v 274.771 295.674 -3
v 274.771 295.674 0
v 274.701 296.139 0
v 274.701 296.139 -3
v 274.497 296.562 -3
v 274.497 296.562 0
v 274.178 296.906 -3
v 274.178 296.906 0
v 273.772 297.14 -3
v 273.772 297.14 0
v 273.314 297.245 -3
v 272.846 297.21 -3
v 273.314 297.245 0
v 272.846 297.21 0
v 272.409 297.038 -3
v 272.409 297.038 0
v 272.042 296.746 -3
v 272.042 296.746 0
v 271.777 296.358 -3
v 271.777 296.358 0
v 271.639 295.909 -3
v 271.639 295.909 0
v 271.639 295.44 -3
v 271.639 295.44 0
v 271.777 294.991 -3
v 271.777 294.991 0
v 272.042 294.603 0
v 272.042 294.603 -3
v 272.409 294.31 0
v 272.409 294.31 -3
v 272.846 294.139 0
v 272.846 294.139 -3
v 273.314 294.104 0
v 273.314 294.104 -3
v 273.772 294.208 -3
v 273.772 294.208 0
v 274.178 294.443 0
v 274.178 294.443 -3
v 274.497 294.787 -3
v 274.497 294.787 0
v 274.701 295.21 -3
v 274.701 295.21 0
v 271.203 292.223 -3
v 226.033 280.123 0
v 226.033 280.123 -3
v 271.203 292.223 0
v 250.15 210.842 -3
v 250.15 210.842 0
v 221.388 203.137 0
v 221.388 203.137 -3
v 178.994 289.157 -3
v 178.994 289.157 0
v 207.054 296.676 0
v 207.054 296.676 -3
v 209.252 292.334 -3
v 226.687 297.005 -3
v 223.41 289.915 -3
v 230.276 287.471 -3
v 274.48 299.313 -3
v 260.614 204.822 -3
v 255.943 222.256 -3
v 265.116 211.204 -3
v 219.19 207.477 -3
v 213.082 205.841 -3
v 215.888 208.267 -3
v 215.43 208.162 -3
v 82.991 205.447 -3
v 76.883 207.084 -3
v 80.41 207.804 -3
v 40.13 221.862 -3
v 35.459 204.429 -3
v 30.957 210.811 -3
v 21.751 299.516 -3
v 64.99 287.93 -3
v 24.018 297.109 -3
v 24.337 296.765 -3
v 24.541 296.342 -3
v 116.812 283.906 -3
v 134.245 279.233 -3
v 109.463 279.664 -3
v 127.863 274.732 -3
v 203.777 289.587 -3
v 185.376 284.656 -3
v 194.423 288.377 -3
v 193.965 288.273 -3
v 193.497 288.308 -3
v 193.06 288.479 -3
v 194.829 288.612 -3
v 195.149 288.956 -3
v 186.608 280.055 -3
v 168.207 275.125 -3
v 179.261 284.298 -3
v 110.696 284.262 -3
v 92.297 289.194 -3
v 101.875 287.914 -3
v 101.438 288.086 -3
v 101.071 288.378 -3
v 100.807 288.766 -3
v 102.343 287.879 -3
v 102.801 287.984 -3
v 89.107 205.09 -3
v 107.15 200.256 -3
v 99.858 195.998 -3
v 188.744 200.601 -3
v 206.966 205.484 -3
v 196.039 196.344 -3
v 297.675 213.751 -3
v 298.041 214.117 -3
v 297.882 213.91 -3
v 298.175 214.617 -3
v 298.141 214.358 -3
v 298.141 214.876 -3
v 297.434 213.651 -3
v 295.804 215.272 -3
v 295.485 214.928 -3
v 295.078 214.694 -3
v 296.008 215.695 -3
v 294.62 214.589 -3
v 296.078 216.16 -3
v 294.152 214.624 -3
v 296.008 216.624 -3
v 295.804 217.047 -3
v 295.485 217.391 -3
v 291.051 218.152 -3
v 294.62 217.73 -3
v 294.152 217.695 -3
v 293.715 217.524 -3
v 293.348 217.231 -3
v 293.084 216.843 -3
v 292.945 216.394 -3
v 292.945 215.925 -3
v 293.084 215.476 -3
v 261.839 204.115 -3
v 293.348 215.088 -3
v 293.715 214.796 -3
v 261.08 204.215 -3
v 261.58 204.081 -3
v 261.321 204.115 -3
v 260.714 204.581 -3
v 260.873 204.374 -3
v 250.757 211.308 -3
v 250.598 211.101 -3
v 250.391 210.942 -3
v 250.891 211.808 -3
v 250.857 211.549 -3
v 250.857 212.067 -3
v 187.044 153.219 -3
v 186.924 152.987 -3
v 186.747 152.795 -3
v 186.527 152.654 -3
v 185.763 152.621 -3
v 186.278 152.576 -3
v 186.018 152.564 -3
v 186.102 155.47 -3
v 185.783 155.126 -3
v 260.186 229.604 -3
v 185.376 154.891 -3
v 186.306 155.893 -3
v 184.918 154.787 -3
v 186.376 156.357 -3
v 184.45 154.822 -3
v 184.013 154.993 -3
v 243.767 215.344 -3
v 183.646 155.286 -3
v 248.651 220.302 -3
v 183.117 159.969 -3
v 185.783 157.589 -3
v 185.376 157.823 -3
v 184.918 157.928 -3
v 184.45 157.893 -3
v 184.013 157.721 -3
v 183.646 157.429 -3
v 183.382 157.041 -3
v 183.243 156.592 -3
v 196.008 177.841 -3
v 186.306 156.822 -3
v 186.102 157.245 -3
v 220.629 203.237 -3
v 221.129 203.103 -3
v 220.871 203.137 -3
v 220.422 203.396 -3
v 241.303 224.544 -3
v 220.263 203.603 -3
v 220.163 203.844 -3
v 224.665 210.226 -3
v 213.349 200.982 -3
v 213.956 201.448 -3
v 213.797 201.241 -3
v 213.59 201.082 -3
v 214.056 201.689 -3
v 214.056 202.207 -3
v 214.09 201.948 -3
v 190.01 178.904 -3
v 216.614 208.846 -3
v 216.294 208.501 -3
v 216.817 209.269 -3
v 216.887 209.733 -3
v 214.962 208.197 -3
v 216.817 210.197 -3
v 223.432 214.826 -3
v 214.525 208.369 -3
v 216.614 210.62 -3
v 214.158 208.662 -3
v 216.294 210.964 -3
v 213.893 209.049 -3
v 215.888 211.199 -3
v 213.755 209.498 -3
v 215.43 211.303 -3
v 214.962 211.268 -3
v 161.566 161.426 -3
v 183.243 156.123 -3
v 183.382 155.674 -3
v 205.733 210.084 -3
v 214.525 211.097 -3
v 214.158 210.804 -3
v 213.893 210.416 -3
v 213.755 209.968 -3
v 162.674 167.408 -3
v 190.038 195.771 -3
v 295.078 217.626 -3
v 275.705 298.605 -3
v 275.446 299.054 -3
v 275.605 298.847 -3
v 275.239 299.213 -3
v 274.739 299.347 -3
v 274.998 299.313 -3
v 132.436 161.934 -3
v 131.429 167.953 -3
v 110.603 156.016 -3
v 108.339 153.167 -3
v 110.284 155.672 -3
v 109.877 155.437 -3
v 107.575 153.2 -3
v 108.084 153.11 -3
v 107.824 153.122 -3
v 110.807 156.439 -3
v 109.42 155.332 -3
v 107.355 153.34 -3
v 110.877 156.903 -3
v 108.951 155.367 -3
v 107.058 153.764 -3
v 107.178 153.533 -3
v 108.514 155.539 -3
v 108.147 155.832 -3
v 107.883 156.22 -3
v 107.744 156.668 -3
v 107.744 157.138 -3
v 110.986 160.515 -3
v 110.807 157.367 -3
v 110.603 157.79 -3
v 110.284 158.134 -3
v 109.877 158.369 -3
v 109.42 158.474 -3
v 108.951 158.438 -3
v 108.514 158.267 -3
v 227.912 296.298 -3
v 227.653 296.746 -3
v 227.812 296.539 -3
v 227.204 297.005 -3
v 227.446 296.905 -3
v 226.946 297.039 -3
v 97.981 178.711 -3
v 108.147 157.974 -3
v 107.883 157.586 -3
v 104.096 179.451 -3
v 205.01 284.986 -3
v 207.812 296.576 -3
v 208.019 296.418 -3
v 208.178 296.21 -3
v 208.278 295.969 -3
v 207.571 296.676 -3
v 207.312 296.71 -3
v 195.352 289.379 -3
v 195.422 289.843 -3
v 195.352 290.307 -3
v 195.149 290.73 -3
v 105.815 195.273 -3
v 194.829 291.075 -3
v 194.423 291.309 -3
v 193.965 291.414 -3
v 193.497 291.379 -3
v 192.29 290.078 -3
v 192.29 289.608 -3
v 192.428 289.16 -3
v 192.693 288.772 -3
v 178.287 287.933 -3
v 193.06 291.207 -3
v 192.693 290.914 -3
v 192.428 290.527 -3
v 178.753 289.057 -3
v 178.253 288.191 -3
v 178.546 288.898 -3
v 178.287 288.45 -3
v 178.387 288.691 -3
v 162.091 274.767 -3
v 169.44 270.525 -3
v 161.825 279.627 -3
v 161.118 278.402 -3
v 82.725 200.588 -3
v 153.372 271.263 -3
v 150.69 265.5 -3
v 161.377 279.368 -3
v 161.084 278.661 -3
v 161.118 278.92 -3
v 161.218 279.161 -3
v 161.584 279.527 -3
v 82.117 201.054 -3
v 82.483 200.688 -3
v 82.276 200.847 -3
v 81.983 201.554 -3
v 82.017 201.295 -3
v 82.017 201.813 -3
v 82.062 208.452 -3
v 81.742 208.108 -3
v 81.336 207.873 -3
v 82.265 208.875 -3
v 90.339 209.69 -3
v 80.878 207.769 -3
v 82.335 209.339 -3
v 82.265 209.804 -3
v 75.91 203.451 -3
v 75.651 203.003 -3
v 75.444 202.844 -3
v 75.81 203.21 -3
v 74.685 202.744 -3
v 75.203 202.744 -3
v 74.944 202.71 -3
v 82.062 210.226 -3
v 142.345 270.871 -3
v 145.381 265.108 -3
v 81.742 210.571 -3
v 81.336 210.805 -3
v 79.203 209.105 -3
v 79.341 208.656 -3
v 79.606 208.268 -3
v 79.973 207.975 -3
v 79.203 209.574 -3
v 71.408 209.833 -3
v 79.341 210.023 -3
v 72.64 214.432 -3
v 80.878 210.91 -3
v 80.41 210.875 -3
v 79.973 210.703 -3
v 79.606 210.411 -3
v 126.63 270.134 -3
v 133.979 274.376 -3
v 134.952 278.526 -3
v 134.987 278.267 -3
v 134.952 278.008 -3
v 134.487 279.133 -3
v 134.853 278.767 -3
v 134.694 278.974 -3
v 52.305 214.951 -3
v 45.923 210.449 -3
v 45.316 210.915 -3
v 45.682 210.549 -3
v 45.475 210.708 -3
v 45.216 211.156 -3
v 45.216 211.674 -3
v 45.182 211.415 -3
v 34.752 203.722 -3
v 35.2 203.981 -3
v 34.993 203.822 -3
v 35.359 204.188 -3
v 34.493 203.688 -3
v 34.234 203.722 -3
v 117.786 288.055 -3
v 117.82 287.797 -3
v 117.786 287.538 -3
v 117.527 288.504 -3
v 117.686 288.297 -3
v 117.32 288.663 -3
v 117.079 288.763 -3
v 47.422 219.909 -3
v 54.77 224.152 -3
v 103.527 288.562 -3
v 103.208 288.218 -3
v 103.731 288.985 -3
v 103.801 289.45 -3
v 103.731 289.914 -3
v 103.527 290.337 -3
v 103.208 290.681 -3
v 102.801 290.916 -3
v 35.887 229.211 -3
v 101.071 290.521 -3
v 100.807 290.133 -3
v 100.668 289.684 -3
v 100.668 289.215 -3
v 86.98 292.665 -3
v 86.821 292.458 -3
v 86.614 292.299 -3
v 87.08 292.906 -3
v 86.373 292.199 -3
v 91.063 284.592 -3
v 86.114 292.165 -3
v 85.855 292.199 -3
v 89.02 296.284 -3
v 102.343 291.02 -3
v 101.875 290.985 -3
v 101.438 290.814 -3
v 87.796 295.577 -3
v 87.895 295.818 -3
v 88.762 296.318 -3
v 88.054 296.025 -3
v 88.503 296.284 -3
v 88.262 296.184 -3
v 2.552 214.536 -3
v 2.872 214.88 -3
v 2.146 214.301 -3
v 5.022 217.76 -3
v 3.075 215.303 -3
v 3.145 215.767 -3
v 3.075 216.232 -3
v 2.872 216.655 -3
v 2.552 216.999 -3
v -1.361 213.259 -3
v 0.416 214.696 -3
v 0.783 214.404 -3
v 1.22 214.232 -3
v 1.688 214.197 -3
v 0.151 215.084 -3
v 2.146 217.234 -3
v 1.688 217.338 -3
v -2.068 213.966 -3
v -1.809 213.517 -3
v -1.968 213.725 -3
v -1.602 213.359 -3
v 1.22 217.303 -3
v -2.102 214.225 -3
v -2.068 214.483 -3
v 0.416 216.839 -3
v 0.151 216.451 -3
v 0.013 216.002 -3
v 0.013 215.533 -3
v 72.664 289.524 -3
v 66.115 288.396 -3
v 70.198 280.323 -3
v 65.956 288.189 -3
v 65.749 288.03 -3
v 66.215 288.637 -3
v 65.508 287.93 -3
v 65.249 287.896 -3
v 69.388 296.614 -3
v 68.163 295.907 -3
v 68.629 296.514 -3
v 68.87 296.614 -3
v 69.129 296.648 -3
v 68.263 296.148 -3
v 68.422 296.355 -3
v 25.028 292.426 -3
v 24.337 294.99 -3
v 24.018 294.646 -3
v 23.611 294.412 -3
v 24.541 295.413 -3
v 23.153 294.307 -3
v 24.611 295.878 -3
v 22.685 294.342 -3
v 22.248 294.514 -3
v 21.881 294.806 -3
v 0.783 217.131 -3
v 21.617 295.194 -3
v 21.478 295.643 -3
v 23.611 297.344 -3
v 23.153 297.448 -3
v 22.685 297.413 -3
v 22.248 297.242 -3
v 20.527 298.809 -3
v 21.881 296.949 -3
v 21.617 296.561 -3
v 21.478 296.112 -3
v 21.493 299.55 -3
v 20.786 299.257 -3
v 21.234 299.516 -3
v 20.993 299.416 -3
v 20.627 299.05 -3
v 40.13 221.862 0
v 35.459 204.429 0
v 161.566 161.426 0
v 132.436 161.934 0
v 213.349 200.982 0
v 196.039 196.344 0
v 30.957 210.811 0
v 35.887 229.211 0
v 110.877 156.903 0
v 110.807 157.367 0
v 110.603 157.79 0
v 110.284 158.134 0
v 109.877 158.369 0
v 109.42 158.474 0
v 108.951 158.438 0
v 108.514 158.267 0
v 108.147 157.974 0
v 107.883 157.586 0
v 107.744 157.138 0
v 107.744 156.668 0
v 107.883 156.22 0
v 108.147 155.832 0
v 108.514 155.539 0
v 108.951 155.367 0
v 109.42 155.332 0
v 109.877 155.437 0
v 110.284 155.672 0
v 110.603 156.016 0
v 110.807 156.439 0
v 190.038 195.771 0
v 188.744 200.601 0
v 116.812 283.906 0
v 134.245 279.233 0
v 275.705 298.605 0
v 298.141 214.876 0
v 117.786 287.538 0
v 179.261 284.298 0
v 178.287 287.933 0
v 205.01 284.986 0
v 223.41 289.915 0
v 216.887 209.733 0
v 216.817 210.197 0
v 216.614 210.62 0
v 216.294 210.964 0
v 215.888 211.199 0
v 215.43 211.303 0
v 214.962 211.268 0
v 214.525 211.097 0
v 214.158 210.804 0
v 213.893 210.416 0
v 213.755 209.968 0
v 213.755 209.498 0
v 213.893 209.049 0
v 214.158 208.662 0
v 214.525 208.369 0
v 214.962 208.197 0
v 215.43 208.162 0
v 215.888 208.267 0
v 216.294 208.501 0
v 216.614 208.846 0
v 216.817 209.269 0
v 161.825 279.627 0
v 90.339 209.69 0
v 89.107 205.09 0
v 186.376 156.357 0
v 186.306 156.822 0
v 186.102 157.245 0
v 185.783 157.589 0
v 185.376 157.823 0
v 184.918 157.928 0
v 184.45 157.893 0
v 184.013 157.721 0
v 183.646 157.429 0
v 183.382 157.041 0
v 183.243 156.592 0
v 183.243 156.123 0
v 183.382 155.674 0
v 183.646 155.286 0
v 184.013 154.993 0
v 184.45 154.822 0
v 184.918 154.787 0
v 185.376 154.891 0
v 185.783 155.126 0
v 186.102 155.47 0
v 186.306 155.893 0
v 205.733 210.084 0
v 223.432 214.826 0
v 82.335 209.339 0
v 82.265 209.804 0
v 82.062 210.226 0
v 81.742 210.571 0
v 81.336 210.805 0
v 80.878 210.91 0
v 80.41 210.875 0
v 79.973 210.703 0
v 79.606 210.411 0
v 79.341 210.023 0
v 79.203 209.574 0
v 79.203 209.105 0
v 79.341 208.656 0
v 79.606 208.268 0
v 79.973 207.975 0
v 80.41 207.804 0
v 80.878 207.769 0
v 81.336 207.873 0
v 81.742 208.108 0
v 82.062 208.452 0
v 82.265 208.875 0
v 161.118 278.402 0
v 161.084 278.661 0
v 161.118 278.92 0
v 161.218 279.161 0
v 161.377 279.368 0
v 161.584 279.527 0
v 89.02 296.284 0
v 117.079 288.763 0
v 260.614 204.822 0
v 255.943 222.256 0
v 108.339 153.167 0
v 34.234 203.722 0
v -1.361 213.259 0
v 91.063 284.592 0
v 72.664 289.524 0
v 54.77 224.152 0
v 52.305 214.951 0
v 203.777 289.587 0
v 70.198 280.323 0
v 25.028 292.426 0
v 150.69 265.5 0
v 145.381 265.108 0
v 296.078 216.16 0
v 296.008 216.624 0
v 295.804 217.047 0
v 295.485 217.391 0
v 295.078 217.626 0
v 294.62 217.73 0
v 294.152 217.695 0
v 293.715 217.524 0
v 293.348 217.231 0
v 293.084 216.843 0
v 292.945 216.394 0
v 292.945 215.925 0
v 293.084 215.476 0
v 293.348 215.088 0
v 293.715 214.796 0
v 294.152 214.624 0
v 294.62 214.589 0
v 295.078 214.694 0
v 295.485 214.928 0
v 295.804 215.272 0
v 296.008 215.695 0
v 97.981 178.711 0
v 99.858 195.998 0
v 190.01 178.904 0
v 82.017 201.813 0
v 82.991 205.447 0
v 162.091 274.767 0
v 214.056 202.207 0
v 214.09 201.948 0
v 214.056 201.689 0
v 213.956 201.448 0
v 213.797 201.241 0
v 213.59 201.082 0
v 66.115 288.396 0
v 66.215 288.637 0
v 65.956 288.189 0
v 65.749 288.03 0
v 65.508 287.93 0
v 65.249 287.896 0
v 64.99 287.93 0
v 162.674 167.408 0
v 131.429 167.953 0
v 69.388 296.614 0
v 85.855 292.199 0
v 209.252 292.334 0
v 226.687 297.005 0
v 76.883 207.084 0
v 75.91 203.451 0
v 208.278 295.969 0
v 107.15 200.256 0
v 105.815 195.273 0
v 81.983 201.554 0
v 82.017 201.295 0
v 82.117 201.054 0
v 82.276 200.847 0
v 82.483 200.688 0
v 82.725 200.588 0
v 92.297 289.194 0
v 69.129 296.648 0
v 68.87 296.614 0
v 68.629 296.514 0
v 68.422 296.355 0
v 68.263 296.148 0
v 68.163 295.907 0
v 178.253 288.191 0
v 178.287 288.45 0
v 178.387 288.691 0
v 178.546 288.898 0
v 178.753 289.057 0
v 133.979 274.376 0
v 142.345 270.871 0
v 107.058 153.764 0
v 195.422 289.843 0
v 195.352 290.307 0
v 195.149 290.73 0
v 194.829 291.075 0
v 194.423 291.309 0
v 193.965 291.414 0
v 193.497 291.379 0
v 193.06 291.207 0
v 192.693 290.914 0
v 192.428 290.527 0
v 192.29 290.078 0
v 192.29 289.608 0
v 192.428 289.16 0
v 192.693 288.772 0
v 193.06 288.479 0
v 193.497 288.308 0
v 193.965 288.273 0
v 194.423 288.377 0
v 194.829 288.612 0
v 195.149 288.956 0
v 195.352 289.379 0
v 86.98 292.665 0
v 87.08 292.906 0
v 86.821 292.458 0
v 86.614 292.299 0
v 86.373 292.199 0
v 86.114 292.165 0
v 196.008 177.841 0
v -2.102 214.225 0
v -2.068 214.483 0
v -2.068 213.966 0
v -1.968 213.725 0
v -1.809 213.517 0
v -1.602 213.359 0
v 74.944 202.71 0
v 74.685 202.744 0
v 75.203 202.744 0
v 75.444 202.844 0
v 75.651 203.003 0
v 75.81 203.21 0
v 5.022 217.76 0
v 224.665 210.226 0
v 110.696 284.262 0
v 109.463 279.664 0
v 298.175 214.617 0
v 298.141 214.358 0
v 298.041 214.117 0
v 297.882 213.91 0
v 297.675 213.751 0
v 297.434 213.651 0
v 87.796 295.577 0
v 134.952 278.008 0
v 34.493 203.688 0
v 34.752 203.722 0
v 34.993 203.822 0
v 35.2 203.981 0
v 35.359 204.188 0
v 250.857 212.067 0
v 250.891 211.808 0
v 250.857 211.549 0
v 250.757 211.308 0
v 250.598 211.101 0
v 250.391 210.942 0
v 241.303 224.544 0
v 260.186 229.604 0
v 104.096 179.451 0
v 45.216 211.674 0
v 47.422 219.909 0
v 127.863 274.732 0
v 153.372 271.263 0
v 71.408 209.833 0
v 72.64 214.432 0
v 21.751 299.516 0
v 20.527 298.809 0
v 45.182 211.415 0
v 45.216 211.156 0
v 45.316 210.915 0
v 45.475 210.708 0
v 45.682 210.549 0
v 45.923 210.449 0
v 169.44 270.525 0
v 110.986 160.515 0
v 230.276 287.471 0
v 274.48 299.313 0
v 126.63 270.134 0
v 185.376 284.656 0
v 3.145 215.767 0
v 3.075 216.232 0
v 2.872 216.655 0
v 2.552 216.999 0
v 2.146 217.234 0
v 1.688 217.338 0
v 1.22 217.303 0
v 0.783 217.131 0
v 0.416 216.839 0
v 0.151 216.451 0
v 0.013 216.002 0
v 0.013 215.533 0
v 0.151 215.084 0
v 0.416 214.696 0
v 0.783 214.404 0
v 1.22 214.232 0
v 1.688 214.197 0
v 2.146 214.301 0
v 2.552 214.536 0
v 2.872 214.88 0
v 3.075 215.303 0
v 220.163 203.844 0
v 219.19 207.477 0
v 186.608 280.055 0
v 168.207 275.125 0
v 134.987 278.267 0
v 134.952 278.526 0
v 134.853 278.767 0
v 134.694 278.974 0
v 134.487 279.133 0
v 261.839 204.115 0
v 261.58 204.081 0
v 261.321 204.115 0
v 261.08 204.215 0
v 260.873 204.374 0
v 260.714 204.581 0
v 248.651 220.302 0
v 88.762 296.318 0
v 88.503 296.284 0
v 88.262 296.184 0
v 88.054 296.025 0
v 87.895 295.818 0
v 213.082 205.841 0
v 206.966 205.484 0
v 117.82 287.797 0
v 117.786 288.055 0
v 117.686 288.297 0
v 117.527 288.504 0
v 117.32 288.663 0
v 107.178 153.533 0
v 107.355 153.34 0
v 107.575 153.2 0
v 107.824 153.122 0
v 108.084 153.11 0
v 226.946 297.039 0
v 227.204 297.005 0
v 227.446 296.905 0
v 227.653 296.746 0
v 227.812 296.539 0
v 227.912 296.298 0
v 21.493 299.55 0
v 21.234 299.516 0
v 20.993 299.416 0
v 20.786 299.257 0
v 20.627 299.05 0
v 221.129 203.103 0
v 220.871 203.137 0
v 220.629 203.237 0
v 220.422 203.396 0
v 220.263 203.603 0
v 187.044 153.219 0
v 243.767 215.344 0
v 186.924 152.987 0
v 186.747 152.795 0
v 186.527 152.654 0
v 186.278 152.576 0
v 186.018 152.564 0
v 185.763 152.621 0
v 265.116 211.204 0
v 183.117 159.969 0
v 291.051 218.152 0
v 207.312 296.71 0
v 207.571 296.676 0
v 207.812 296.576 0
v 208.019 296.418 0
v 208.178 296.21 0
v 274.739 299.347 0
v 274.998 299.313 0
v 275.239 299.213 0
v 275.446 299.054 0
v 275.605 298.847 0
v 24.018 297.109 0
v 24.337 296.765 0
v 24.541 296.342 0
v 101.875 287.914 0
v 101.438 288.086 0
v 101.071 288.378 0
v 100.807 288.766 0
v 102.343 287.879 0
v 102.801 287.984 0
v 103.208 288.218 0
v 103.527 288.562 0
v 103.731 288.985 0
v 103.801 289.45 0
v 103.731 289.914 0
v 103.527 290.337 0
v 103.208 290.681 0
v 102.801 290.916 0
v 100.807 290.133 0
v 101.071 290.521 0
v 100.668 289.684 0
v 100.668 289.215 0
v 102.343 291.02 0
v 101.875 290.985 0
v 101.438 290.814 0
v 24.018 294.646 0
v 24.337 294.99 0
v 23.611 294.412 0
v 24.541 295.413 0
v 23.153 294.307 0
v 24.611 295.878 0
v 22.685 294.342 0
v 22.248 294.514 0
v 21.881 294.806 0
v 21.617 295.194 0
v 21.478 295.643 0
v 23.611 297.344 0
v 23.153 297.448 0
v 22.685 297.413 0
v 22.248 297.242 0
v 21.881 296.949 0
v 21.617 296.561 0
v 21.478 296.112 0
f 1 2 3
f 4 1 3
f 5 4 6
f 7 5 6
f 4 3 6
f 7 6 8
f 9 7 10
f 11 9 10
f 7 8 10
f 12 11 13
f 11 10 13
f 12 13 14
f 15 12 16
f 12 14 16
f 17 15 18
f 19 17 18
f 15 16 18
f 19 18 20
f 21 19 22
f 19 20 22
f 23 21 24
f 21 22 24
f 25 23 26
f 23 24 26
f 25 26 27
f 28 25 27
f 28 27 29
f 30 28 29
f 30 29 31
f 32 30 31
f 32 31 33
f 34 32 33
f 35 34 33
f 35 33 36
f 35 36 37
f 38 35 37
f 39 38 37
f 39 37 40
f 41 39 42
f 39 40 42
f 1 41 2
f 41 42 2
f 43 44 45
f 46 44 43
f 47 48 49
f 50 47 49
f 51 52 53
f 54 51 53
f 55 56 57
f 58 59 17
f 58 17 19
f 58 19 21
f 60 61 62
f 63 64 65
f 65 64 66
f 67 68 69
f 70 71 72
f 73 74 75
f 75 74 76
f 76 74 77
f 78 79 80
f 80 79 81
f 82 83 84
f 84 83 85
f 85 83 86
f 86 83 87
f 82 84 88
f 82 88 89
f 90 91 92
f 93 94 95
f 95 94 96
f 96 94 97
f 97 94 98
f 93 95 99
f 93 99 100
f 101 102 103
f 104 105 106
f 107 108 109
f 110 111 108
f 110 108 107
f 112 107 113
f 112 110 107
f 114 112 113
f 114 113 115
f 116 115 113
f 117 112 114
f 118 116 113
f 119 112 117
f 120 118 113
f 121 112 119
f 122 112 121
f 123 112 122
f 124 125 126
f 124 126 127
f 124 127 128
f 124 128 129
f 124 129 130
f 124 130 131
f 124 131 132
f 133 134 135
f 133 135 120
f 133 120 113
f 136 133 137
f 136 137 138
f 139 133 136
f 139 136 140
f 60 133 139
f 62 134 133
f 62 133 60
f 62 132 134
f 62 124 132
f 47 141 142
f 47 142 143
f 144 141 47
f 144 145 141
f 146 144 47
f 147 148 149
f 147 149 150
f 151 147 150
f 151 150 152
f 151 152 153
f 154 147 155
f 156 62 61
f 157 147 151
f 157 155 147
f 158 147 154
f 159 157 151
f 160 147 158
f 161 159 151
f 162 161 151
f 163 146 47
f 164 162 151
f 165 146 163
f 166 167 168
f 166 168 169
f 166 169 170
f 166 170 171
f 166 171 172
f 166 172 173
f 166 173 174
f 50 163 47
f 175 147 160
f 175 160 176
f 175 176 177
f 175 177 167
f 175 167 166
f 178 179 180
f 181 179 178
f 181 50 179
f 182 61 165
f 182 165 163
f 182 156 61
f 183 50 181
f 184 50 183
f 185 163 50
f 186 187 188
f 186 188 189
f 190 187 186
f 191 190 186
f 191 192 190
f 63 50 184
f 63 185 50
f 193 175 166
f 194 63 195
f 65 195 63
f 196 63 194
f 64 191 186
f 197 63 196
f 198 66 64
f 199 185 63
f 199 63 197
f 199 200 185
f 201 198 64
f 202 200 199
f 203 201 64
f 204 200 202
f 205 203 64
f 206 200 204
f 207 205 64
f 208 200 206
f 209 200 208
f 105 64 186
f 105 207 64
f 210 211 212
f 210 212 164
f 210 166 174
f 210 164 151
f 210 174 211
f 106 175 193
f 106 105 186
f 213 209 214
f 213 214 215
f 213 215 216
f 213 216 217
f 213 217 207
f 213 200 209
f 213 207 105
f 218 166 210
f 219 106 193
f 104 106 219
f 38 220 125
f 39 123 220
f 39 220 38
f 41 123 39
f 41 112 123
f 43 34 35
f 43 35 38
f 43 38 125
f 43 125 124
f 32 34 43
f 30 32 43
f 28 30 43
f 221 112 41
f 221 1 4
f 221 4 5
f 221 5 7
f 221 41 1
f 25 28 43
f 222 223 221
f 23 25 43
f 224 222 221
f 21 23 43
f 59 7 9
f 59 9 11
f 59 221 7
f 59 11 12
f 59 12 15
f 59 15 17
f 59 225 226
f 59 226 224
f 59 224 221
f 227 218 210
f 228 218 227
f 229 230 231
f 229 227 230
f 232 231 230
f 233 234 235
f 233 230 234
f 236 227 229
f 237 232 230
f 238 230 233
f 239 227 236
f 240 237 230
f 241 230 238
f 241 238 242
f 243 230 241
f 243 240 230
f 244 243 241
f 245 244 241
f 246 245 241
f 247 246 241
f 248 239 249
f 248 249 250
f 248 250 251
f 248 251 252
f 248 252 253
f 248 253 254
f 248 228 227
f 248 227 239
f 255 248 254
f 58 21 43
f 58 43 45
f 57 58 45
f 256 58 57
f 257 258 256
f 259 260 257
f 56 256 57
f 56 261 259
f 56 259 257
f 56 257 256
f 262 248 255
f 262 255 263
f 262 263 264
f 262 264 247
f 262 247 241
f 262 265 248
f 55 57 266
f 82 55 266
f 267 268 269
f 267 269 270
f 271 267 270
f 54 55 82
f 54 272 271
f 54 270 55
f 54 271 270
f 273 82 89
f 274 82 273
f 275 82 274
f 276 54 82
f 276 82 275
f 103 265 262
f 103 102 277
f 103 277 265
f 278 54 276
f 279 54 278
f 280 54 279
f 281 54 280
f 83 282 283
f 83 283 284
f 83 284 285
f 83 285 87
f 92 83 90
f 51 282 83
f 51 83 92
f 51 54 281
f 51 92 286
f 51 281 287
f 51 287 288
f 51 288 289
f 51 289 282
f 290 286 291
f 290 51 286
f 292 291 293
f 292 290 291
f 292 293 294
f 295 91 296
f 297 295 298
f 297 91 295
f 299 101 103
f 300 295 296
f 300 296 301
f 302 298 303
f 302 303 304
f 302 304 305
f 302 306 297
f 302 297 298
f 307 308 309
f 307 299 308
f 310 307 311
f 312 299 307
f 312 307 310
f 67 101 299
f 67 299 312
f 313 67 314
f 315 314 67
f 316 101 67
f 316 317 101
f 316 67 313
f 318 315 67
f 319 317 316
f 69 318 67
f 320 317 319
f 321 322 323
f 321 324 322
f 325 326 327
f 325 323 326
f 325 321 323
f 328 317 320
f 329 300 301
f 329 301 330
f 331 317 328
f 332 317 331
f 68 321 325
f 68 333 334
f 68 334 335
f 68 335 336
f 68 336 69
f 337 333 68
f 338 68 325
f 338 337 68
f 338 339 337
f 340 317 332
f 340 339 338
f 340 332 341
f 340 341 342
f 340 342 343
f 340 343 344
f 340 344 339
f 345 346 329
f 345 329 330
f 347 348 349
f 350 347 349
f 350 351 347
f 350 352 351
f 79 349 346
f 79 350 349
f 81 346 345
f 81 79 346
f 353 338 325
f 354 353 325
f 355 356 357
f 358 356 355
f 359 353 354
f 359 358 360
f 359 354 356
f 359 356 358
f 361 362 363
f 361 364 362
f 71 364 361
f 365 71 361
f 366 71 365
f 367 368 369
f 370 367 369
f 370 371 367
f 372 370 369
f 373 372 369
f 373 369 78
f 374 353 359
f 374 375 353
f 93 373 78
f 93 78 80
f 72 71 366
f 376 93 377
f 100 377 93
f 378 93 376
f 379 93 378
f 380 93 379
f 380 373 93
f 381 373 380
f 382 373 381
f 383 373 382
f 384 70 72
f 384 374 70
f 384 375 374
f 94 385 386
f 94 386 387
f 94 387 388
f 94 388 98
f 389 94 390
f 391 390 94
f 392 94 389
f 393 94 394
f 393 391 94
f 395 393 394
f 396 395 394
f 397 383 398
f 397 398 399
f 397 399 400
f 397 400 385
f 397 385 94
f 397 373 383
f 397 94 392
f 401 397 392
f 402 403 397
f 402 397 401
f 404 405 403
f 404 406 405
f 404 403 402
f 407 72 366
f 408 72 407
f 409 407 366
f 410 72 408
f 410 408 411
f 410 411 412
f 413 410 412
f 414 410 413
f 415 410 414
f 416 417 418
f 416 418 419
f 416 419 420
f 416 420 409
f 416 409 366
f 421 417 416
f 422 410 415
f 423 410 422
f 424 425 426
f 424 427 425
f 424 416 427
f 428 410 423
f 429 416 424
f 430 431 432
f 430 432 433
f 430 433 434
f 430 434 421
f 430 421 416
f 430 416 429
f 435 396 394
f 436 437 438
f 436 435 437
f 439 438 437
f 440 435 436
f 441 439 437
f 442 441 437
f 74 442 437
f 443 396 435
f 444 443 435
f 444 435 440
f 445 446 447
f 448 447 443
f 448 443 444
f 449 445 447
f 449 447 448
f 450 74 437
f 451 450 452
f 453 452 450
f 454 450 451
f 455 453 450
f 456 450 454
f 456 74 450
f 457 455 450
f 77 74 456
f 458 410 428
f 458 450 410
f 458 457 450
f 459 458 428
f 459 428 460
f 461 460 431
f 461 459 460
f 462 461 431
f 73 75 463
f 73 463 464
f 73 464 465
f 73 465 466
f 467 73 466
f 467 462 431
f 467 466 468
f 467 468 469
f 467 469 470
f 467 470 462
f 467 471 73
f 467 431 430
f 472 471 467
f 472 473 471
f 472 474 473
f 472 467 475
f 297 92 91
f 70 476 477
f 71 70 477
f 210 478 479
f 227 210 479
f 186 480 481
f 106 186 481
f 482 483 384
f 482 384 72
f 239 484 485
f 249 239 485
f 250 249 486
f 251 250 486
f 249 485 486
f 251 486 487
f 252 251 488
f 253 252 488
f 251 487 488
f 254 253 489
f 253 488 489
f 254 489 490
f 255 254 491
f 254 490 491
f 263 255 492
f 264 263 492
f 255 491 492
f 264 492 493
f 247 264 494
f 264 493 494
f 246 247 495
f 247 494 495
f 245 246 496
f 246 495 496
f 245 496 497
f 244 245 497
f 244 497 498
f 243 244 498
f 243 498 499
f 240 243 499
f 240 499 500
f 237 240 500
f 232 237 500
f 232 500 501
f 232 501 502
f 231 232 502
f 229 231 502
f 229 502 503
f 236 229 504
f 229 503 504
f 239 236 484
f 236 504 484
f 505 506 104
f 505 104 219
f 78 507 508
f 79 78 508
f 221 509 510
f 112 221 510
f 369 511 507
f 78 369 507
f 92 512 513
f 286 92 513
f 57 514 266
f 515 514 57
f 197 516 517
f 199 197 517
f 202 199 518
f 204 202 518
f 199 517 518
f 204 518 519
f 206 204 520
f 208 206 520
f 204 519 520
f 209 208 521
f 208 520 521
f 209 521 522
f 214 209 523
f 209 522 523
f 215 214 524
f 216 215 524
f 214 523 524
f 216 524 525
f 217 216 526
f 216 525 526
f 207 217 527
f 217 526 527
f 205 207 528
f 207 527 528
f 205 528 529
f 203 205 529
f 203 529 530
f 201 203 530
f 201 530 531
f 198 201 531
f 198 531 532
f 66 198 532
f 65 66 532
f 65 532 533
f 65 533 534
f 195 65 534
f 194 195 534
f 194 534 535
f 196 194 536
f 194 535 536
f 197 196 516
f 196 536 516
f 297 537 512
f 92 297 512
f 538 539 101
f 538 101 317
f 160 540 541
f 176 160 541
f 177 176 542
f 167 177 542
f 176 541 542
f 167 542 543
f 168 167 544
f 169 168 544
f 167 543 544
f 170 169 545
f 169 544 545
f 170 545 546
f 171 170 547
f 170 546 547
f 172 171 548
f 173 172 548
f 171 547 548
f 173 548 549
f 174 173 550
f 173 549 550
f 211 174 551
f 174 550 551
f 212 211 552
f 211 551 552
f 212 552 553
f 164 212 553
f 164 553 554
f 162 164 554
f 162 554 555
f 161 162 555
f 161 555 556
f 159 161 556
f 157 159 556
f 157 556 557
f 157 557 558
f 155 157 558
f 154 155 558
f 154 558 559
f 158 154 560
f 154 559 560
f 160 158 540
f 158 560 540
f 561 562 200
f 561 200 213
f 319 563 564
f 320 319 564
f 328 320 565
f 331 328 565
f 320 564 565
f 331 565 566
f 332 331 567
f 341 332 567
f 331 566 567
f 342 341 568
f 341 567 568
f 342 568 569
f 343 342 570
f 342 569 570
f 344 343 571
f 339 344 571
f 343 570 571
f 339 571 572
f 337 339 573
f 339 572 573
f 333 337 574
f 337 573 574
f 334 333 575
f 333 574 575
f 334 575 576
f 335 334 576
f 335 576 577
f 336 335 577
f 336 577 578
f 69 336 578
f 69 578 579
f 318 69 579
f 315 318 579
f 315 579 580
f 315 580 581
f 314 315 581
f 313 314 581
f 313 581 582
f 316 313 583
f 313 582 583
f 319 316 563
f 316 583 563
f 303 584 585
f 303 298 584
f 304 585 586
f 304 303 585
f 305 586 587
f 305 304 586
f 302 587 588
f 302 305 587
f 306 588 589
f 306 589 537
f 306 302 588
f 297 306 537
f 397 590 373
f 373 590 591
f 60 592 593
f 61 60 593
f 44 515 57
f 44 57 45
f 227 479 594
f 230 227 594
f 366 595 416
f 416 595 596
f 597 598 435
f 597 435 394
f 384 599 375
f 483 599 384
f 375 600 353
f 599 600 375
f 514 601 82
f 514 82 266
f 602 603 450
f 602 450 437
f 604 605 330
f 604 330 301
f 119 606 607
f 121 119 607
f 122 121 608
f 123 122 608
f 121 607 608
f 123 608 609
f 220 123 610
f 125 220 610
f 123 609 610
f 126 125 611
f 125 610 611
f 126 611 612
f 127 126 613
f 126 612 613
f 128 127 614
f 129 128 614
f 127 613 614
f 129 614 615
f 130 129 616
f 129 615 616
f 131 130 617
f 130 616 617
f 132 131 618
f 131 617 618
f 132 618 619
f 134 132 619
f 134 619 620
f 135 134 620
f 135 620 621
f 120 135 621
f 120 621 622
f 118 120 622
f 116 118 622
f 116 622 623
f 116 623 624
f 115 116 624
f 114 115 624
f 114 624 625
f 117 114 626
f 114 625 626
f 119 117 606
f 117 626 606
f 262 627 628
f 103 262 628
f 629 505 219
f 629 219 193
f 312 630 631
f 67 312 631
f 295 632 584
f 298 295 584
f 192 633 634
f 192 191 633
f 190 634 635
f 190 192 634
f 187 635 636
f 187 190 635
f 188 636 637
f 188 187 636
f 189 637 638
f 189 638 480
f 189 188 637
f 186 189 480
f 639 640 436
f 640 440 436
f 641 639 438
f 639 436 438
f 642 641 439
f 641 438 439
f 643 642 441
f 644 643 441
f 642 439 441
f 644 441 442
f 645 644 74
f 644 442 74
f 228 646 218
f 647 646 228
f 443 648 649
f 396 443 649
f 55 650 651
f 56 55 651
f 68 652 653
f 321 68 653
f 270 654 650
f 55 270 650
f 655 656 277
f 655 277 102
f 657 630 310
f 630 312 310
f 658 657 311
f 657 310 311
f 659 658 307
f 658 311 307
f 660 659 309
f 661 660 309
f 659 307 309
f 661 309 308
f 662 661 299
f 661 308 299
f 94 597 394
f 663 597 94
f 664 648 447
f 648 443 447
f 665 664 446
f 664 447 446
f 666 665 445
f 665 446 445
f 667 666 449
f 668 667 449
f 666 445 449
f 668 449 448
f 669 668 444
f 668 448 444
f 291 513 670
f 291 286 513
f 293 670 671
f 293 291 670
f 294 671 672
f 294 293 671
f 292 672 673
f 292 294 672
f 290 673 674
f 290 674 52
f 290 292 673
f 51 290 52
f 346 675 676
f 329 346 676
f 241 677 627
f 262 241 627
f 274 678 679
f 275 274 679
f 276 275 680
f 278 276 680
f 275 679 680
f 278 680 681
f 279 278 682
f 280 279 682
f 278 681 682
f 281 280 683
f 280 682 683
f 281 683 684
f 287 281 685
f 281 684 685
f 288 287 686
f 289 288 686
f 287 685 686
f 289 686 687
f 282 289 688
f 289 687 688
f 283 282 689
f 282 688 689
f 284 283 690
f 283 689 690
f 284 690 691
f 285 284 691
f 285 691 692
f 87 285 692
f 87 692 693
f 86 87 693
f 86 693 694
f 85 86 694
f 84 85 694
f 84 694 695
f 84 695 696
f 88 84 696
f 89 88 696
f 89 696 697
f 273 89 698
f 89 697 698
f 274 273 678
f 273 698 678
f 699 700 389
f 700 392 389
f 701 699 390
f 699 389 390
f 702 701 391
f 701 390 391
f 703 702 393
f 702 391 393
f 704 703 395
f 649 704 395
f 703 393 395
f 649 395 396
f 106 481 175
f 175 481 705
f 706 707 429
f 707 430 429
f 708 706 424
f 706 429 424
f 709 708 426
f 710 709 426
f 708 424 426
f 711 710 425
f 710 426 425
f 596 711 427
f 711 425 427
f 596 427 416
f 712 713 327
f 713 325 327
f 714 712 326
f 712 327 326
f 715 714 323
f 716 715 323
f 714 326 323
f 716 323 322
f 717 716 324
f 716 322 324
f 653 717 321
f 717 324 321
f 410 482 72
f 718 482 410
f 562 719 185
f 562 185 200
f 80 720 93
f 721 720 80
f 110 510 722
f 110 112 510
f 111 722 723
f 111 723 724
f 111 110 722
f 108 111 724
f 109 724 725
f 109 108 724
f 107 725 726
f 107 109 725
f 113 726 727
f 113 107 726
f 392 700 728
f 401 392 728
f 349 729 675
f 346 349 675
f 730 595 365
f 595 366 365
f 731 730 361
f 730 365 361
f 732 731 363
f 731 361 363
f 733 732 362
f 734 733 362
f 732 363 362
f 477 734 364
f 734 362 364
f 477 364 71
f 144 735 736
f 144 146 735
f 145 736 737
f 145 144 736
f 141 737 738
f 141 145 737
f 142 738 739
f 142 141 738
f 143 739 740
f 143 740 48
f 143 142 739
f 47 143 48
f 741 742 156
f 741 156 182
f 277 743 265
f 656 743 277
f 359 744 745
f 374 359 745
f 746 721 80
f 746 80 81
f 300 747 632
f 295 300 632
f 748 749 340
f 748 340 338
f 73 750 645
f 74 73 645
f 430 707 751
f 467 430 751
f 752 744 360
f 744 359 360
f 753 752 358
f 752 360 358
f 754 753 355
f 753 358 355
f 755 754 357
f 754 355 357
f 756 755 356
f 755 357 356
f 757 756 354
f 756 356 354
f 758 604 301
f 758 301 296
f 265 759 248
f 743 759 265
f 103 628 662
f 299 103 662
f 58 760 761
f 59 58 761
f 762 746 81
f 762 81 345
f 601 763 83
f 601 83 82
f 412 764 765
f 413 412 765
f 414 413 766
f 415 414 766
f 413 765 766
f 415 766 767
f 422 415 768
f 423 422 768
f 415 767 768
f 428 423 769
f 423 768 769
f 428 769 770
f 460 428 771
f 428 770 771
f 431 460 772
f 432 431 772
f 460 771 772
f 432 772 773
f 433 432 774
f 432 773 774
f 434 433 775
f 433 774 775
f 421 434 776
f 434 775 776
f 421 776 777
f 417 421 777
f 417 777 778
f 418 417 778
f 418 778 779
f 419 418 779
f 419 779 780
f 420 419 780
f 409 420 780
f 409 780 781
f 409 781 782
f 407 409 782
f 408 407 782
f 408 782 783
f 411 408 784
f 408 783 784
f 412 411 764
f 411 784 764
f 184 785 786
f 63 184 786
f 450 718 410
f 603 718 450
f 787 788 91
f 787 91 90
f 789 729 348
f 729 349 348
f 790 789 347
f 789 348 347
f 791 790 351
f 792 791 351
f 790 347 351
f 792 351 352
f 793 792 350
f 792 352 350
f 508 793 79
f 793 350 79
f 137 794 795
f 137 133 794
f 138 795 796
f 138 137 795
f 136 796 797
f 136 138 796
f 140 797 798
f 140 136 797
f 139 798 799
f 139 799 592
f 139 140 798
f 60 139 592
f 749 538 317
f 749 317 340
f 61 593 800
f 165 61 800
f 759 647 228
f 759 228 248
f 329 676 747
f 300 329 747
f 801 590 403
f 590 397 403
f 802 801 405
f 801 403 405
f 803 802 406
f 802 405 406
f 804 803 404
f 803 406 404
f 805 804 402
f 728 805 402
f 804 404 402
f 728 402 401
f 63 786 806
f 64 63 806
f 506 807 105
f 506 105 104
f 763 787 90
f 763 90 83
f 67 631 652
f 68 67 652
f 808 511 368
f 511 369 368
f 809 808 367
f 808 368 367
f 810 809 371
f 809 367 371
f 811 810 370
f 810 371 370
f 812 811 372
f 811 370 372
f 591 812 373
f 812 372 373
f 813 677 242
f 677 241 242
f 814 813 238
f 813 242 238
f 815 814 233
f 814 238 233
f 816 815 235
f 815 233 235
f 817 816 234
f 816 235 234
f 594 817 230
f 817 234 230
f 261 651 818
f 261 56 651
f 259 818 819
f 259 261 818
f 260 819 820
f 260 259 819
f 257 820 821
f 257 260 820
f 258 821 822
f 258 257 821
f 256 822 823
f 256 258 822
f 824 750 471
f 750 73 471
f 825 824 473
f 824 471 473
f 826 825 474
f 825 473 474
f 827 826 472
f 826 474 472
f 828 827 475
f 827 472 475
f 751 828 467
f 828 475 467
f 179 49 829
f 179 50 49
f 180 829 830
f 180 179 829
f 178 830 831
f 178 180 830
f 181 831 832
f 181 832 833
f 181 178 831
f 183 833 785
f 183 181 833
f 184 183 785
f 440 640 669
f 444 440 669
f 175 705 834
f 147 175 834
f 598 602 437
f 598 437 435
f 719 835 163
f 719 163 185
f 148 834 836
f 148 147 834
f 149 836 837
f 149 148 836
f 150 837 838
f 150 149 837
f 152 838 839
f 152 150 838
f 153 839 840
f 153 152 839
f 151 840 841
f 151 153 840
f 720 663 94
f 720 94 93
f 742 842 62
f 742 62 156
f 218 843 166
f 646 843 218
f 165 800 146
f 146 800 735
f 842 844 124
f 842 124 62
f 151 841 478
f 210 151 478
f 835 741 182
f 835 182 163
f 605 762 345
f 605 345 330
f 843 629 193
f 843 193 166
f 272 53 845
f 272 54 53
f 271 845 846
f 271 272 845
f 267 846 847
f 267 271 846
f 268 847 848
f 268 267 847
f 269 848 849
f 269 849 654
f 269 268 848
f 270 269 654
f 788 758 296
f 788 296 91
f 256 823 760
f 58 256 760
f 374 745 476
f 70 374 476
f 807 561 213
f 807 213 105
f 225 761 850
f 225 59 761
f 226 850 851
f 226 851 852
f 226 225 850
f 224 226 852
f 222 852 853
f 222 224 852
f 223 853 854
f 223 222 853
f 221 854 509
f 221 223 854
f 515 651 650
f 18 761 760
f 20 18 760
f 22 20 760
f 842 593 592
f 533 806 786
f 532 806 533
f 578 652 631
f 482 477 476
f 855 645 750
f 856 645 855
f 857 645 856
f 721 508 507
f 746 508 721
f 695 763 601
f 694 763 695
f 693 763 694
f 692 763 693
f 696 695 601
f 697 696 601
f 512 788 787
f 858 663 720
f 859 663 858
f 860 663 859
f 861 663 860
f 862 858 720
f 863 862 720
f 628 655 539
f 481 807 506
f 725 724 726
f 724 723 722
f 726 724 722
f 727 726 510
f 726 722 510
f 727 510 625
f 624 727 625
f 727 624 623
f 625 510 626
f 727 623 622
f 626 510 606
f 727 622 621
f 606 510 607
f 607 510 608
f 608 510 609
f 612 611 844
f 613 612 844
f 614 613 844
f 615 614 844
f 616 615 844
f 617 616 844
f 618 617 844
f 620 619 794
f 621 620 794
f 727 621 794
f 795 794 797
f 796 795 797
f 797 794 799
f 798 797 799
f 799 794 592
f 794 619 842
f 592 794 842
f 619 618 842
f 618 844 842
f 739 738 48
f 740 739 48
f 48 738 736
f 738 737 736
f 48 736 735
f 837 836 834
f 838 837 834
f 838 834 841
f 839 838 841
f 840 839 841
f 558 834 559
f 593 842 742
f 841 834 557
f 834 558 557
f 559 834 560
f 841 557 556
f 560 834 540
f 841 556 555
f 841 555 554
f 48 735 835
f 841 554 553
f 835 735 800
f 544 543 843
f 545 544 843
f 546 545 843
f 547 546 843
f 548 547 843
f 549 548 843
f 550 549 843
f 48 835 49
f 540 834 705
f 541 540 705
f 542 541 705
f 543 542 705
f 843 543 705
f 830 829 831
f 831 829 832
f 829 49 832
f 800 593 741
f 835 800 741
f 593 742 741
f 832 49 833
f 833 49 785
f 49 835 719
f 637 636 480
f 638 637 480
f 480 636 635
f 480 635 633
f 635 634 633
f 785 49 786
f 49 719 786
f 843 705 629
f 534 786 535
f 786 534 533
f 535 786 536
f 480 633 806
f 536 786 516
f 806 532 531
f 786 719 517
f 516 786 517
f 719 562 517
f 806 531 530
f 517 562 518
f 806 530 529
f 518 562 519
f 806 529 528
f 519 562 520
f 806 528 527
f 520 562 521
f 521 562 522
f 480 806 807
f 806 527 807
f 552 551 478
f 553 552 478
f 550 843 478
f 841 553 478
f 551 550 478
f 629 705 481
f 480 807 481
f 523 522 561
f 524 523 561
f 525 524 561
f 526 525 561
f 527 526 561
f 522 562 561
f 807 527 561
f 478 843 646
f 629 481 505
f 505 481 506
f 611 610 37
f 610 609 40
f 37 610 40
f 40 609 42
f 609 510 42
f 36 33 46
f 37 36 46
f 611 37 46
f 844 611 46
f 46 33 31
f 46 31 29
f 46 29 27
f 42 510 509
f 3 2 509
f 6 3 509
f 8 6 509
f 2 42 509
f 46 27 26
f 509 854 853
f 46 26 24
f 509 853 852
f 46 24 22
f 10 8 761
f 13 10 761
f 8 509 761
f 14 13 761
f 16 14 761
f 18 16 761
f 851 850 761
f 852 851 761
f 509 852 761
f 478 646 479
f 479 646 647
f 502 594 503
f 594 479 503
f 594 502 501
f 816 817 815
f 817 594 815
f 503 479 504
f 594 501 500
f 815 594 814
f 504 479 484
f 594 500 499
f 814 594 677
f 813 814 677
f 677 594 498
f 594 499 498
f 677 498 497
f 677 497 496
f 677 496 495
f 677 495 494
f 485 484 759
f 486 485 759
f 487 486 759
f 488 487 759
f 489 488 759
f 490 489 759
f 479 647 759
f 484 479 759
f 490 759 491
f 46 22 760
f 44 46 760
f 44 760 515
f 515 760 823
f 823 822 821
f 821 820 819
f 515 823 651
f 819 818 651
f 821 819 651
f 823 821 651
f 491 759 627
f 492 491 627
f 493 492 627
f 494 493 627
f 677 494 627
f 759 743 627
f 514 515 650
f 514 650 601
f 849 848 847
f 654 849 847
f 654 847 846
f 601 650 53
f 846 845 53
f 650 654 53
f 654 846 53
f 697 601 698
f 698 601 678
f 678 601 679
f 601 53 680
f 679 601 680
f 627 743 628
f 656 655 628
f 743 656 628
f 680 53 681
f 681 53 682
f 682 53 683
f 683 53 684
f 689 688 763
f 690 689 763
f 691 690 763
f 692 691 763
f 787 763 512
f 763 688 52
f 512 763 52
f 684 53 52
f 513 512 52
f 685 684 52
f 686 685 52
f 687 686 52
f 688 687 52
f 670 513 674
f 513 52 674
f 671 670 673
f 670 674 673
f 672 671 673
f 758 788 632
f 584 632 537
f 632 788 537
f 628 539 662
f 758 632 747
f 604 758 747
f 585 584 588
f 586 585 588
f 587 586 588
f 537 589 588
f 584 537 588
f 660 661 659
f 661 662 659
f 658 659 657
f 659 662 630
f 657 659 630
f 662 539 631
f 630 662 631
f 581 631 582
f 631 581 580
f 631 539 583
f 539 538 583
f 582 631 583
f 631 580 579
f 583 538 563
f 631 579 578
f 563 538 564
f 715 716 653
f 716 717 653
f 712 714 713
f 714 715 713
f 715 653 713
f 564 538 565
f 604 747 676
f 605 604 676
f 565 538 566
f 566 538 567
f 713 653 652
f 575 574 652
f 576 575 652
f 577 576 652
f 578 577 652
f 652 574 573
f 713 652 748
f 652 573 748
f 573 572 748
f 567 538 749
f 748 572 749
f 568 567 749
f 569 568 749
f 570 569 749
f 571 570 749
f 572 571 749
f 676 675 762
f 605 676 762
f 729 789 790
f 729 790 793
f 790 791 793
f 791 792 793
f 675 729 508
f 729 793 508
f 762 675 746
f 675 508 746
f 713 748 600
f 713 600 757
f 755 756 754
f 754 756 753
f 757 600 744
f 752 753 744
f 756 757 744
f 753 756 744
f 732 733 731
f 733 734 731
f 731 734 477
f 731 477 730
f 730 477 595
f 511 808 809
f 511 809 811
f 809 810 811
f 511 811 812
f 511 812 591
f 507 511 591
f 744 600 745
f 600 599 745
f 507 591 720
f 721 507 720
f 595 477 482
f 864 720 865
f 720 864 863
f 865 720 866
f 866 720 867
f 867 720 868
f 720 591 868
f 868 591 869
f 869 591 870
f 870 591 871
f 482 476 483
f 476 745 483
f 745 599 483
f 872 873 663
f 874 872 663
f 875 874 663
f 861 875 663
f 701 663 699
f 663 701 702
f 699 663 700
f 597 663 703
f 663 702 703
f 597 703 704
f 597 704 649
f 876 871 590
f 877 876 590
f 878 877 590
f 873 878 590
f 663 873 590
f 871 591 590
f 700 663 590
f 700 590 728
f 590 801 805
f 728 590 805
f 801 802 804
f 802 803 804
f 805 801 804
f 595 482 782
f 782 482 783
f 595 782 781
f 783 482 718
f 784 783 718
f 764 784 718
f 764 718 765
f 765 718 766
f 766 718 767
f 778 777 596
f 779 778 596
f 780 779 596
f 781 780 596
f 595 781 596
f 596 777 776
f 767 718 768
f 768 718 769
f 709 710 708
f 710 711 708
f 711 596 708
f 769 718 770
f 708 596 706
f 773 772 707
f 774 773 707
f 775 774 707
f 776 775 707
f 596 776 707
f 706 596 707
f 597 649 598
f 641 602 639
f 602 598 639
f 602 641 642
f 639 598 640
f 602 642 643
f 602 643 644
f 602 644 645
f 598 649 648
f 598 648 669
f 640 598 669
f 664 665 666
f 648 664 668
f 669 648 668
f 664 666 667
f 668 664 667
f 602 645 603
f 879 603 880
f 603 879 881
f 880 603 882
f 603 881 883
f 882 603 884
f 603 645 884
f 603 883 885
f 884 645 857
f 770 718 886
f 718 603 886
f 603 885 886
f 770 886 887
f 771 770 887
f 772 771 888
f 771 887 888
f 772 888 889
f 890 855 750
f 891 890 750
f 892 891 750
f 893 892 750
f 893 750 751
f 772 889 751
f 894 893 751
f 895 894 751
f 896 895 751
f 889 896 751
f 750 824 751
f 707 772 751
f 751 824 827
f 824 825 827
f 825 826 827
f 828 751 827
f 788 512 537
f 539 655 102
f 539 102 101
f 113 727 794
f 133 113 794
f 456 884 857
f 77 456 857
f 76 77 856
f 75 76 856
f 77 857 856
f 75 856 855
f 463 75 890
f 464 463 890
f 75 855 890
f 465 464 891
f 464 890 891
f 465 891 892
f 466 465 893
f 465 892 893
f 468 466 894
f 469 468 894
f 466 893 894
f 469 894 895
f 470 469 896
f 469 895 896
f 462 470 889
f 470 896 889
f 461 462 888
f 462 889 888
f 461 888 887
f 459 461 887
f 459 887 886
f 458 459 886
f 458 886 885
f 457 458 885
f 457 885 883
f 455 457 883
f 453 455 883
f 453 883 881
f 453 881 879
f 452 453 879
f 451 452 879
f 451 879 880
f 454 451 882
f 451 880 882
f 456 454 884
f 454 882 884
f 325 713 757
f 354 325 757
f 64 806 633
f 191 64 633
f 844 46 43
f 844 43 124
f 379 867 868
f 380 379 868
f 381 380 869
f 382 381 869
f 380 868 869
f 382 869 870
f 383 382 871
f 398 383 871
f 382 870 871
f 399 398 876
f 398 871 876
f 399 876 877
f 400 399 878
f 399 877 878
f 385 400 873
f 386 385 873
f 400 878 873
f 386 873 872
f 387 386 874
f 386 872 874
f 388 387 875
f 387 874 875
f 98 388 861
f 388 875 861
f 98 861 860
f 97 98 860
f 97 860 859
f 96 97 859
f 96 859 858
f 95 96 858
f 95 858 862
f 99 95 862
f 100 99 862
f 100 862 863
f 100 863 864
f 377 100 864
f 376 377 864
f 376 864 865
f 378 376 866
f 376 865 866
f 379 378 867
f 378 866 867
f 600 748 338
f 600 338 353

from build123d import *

# Parameters (mm, degrees)
MODEL_R             = 1.575
BOSS_EXTRUDE1_DEPTH = 3
FILLET1_R           = 1


with BuildPart() as part:
    # Model → Boss-Extrude1 (new body)
    with BuildSketch(Plane.XY):
        Polygon((142.344747242, 270.871489374), (153.37187249, 271.263447748), (162.091473536, 274.767362889), (160.85900272, 279.367807803), (179.260689602, 284.297666211), (178.028627015, 288.898354165), (208.019481767, 296.93522173), (209.252454514, 292.334187025), (227.65276755, 297.263677376), (230.276304619, 287.470798216), (275.446186014, 299.571346393), (298.39980436, 213.909597233), (260.87259576, 203.855963236), (255.943287021, 222.255598366), (248.650938057, 220.301667543), (251.115775513, 211.101166572), (220.422247557, 202.878292884), (219.189771603, 207.477473721), (213.081966369, 205.841177268), (214.314693354, 201.241059665), (196.039346948, 196.343682115), (196.007810089, 177.840578221), (186.702312667, 152.27893851), (161.565977706, 161.426447529), (132.435827139, 161.934428279), (107.399642776, 152.824765622), (97.980730454, 178.710864183), (99.858189105, 195.997881416), (81.758593313, 200.846808858), (82.991121062, 205.447466285), (76.882860045, 207.083884844), (75.650856625, 202.485184579), (44.956891994, 210.708175253), (47.421773629, 219.90863481), (40.129543563, 221.862285479), (35.199939127, 203.463086712), (-2.32684459, 213.517448416), (20.785545351, 299.774827661), (65.955825932, 287.671594898), (68.42160019, 296.872525865), (86.820985153, 291.940533454), (88.054439652, 296.542595671), (118.044472643, 288.503706576), (116.812112756, 283.905728394), (135.211333861, 278.973779905), (133.979081507, 274.376202933), align=None)
        with Locations((23.035554, 295.877718337)):
            Circle(MODEL_R, mode=Mode.SUBTRACT)
        with Locations((109.301822433, 156.902965293)):
            Circle(MODEL_R, mode=Mode.SUBTRACT)
        with Locations((184.800560745, 156.35733766)):
            Circle(MODEL_R, mode=Mode.SUBTRACT)
        with Locations((193.847437398, 289.84318413)):
            Circle(MODEL_R, mode=Mode.SUBTRACT)
        with Locations((102.225689846, 289.449650012)):
            Circle(MODEL_R, mode=Mode.SUBTRACT)
        with Locations((273.19609114, 295.674286852)):
            Circle(MODEL_R, mode=Mode.SUBTRACT)
        with Locations((1.570241786, 215.767496811)):
            Circle(MODEL_R, mode=Mode.SUBTRACT)
        with Locations((294.502731407, 216.159668876)):
            Circle(MODEL_R, mode=Mode.SUBTRACT)
        with Locations((80.760413887, 209.339268578)):
            Circle(MODEL_R, mode=Mode.SUBTRACT)
        with Locations((215.312231294, 209.732861073)):
            Circle(MODEL_R, mode=Mode.SUBTRACT)
        Polygon((271.203498451, 292.223209107), (291.05122826, 218.15247975), (265.115556398, 211.204247731), (260.186189629, 229.604099473), (241.30271159, 224.544411578), (243.767491017, 215.34412721), (224.664804007, 210.226469096), (223.432328054, 214.825649934), (205.733277658, 210.084029615), (206.966112962, 205.483507804), (188.744476932, 200.600523414), (190.038361872, 195.770837942), (190.009613349, 178.903688177), (183.116533861, 159.968814913), (162.674398087, 167.40803076), (131.428930231, 167.95289908), (110.986427135, 160.514692668), (104.096364698, 179.45072575), (105.814746135, 195.273012707), (107.149713912, 200.256048118), (89.106877808, 205.089769496), (90.339405557, 209.690426923), (72.639899407, 214.432169339), (71.407895987, 209.833469074), (52.305208977, 214.951127188), (54.770081908, 224.151554257), (35.886712889, 229.210569975), (30.957132238, 210.811459981), (5.0216469, 217.76022363), (25.028202346, 292.426367848), (70.198239559, 280.323200295), (72.663861356, 289.523562363), (91.063082461, 284.591613875), (92.29653696, 289.193676092), (110.695758065, 284.261727603), (109.463398178, 279.663749421), (127.862619282, 274.731800932), (126.630323598, 270.134062294), (145.381260936, 265.108396206), (150.690394167, 265.500431998), (169.439649748, 270.524806438), (168.207287216, 275.124847165), (186.60841776, 280.054556529), (185.376246939, 284.655648642), (203.777033628, 289.586641337), (205.009898064, 284.986010813), (223.409806911, 289.915392881), (226.033325469, 280.122582817), align=None, mode=Mode.SUBTRACT)
    extrude(amount=-BOSS_EXTRUDE1_DEPTH)

    # Fillet1
    fillet1_edges = [part.edges().sort_by_distance(p)[0] for p in [
        (-2.32684459, 213.517448416, -1.5),
        (20.785545351, 299.774827661, -1.5),
        (65.955825932, 287.671594898, -1.5),
        (68.42160019, 296.872525865, -1.5),
        (86.820985153, 291.940533454, -1.5),
        (88.054439652, 296.542595671, -1.5),
        (118.044472643, 288.503706576, -1.5),
        (135.211333861, 278.973779905, -1.5),
        (160.85900272, 279.367807803, -1.5),
        (178.028627015, 288.898354165, -1.5),
        (208.019481767, 296.93522173, -1.5),
        (227.65276755, 297.263677376, -1.5),
        (275.446186014, 299.571346393, -1.5),
        (298.39980436, 213.909597233, -1.5),
        (260.87259576, 203.855963236, -1.5),
        (251.115775513, 211.101166572, -1.5),
        (220.422247557, 202.878292884, -1.5),
        (214.314693354, 201.241059665, -1.5),
        (186.702312667, 152.27893851, -1.5),
        (107.399642776, 152.824765622, -1.5),
        (81.758593313, 200.846808858, -1.5),
        (75.650856625, 202.485184579, -1.5),
        (44.956891994, 210.708175253, -1.5),
        (35.199939127, 203.463086712, -1.5),
    ]]
    fillet(fillet1_edges, radius=FILLET1_R)


solid = part.part
